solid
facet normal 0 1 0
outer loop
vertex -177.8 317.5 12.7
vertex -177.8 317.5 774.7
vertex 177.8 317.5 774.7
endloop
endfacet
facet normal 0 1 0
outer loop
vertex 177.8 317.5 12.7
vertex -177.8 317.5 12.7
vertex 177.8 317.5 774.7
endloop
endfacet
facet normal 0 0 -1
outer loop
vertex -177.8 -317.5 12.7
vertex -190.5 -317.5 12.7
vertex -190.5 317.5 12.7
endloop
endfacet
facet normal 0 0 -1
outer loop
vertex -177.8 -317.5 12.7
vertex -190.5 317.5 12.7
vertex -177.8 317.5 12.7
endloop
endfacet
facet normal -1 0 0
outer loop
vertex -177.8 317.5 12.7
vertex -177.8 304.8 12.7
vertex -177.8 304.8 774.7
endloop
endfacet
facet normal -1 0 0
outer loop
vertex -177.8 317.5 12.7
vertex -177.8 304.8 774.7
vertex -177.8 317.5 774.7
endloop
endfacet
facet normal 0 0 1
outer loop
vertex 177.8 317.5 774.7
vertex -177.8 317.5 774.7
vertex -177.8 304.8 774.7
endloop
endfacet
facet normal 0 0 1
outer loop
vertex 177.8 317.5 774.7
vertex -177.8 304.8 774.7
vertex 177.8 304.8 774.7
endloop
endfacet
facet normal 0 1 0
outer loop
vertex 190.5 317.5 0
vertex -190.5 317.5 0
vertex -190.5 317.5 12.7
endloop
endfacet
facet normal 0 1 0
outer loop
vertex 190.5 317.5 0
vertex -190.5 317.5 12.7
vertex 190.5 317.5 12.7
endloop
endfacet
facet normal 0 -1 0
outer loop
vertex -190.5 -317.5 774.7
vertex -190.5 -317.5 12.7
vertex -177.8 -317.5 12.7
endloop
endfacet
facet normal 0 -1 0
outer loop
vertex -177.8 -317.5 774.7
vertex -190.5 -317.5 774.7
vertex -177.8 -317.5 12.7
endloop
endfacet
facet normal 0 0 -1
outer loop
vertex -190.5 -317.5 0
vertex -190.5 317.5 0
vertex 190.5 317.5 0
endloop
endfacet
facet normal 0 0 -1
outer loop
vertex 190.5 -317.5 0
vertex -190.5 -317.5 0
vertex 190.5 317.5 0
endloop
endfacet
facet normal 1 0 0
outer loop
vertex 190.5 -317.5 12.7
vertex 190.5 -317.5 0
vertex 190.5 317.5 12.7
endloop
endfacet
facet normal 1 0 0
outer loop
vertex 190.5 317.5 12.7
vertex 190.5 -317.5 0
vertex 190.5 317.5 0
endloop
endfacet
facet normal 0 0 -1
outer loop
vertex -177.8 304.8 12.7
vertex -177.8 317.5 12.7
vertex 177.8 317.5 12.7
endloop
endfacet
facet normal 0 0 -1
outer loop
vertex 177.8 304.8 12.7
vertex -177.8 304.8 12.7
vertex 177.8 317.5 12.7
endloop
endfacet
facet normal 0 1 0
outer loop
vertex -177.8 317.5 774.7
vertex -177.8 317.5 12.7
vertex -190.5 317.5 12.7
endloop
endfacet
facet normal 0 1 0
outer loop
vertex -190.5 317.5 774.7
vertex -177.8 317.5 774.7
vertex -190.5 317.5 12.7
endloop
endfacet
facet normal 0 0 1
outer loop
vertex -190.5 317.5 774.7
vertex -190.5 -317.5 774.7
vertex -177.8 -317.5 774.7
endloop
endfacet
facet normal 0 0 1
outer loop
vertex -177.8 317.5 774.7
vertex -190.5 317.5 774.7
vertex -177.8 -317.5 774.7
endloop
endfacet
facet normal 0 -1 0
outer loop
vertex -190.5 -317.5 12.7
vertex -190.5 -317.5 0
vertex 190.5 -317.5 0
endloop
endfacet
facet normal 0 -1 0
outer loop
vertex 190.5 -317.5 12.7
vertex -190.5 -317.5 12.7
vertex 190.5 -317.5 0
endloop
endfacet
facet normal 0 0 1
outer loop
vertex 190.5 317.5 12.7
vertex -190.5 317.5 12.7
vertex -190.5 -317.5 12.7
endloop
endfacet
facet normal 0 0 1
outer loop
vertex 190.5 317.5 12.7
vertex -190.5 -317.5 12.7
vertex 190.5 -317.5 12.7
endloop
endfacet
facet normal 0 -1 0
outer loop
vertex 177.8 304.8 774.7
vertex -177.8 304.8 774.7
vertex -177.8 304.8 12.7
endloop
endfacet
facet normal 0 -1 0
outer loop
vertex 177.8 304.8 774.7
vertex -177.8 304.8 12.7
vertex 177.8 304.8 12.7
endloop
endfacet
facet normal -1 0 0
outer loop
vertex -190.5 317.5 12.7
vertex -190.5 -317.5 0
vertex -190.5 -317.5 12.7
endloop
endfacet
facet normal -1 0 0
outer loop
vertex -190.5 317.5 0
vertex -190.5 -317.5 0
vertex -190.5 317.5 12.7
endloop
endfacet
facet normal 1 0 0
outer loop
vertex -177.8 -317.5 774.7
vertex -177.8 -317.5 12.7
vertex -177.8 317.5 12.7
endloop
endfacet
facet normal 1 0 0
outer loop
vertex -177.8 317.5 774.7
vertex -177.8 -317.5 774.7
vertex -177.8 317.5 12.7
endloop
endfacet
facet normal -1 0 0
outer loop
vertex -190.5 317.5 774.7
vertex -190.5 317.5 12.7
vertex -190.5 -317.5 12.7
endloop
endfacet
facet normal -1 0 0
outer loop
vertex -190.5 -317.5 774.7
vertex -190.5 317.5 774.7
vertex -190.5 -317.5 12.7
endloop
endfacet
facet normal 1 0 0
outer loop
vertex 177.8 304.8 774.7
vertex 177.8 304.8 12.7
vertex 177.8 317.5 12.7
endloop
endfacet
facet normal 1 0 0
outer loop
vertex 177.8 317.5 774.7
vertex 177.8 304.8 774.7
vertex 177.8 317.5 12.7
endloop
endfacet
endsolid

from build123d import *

# Parameters (mm, degrees)
F0_W     = 381
F0_H     = 635
F3_DEPTH = 12.7
F5_DEPTH = 762
F4_W     = 355.6
F4_H     = 12.7
F6_DEPTH = 762


# Not quite as in the source:
# - a variable given as a bare number and used for a length is read in inches; the dataset says mm whatever the document's units were


with BuildPart() as f3:
    # F0 (on Top) → F3 (new body)
    with BuildSketch(Plane.XY):
        Rectangle(F0_W, F0_H)
    extrude(amount=F3_DEPTH)


with BuildPart() as f5:
    # F4 (on face) → F5 (new body)
    with BuildSketch(Plane.XY.offset(12.7)):
        Polygon((-190.5, 317.5), (-190.5, -317.5), (-177.8, -317.5), (-177.8, 304.8), (-177.8, 317.5), align=None)
    extrude(amount=F5_DEPTH)


with BuildPart() as f6:
    # F4 (on face) → F6 (new body)
    with BuildSketch(Plane.XY.offset(12.7)):
        with Locations((0, 311.15)):
            Rectangle(F4_W, F4_H)
    extrude(amount=F6_DEPTH)


solid = Compound([f3.part, f5.part, f6.part])
